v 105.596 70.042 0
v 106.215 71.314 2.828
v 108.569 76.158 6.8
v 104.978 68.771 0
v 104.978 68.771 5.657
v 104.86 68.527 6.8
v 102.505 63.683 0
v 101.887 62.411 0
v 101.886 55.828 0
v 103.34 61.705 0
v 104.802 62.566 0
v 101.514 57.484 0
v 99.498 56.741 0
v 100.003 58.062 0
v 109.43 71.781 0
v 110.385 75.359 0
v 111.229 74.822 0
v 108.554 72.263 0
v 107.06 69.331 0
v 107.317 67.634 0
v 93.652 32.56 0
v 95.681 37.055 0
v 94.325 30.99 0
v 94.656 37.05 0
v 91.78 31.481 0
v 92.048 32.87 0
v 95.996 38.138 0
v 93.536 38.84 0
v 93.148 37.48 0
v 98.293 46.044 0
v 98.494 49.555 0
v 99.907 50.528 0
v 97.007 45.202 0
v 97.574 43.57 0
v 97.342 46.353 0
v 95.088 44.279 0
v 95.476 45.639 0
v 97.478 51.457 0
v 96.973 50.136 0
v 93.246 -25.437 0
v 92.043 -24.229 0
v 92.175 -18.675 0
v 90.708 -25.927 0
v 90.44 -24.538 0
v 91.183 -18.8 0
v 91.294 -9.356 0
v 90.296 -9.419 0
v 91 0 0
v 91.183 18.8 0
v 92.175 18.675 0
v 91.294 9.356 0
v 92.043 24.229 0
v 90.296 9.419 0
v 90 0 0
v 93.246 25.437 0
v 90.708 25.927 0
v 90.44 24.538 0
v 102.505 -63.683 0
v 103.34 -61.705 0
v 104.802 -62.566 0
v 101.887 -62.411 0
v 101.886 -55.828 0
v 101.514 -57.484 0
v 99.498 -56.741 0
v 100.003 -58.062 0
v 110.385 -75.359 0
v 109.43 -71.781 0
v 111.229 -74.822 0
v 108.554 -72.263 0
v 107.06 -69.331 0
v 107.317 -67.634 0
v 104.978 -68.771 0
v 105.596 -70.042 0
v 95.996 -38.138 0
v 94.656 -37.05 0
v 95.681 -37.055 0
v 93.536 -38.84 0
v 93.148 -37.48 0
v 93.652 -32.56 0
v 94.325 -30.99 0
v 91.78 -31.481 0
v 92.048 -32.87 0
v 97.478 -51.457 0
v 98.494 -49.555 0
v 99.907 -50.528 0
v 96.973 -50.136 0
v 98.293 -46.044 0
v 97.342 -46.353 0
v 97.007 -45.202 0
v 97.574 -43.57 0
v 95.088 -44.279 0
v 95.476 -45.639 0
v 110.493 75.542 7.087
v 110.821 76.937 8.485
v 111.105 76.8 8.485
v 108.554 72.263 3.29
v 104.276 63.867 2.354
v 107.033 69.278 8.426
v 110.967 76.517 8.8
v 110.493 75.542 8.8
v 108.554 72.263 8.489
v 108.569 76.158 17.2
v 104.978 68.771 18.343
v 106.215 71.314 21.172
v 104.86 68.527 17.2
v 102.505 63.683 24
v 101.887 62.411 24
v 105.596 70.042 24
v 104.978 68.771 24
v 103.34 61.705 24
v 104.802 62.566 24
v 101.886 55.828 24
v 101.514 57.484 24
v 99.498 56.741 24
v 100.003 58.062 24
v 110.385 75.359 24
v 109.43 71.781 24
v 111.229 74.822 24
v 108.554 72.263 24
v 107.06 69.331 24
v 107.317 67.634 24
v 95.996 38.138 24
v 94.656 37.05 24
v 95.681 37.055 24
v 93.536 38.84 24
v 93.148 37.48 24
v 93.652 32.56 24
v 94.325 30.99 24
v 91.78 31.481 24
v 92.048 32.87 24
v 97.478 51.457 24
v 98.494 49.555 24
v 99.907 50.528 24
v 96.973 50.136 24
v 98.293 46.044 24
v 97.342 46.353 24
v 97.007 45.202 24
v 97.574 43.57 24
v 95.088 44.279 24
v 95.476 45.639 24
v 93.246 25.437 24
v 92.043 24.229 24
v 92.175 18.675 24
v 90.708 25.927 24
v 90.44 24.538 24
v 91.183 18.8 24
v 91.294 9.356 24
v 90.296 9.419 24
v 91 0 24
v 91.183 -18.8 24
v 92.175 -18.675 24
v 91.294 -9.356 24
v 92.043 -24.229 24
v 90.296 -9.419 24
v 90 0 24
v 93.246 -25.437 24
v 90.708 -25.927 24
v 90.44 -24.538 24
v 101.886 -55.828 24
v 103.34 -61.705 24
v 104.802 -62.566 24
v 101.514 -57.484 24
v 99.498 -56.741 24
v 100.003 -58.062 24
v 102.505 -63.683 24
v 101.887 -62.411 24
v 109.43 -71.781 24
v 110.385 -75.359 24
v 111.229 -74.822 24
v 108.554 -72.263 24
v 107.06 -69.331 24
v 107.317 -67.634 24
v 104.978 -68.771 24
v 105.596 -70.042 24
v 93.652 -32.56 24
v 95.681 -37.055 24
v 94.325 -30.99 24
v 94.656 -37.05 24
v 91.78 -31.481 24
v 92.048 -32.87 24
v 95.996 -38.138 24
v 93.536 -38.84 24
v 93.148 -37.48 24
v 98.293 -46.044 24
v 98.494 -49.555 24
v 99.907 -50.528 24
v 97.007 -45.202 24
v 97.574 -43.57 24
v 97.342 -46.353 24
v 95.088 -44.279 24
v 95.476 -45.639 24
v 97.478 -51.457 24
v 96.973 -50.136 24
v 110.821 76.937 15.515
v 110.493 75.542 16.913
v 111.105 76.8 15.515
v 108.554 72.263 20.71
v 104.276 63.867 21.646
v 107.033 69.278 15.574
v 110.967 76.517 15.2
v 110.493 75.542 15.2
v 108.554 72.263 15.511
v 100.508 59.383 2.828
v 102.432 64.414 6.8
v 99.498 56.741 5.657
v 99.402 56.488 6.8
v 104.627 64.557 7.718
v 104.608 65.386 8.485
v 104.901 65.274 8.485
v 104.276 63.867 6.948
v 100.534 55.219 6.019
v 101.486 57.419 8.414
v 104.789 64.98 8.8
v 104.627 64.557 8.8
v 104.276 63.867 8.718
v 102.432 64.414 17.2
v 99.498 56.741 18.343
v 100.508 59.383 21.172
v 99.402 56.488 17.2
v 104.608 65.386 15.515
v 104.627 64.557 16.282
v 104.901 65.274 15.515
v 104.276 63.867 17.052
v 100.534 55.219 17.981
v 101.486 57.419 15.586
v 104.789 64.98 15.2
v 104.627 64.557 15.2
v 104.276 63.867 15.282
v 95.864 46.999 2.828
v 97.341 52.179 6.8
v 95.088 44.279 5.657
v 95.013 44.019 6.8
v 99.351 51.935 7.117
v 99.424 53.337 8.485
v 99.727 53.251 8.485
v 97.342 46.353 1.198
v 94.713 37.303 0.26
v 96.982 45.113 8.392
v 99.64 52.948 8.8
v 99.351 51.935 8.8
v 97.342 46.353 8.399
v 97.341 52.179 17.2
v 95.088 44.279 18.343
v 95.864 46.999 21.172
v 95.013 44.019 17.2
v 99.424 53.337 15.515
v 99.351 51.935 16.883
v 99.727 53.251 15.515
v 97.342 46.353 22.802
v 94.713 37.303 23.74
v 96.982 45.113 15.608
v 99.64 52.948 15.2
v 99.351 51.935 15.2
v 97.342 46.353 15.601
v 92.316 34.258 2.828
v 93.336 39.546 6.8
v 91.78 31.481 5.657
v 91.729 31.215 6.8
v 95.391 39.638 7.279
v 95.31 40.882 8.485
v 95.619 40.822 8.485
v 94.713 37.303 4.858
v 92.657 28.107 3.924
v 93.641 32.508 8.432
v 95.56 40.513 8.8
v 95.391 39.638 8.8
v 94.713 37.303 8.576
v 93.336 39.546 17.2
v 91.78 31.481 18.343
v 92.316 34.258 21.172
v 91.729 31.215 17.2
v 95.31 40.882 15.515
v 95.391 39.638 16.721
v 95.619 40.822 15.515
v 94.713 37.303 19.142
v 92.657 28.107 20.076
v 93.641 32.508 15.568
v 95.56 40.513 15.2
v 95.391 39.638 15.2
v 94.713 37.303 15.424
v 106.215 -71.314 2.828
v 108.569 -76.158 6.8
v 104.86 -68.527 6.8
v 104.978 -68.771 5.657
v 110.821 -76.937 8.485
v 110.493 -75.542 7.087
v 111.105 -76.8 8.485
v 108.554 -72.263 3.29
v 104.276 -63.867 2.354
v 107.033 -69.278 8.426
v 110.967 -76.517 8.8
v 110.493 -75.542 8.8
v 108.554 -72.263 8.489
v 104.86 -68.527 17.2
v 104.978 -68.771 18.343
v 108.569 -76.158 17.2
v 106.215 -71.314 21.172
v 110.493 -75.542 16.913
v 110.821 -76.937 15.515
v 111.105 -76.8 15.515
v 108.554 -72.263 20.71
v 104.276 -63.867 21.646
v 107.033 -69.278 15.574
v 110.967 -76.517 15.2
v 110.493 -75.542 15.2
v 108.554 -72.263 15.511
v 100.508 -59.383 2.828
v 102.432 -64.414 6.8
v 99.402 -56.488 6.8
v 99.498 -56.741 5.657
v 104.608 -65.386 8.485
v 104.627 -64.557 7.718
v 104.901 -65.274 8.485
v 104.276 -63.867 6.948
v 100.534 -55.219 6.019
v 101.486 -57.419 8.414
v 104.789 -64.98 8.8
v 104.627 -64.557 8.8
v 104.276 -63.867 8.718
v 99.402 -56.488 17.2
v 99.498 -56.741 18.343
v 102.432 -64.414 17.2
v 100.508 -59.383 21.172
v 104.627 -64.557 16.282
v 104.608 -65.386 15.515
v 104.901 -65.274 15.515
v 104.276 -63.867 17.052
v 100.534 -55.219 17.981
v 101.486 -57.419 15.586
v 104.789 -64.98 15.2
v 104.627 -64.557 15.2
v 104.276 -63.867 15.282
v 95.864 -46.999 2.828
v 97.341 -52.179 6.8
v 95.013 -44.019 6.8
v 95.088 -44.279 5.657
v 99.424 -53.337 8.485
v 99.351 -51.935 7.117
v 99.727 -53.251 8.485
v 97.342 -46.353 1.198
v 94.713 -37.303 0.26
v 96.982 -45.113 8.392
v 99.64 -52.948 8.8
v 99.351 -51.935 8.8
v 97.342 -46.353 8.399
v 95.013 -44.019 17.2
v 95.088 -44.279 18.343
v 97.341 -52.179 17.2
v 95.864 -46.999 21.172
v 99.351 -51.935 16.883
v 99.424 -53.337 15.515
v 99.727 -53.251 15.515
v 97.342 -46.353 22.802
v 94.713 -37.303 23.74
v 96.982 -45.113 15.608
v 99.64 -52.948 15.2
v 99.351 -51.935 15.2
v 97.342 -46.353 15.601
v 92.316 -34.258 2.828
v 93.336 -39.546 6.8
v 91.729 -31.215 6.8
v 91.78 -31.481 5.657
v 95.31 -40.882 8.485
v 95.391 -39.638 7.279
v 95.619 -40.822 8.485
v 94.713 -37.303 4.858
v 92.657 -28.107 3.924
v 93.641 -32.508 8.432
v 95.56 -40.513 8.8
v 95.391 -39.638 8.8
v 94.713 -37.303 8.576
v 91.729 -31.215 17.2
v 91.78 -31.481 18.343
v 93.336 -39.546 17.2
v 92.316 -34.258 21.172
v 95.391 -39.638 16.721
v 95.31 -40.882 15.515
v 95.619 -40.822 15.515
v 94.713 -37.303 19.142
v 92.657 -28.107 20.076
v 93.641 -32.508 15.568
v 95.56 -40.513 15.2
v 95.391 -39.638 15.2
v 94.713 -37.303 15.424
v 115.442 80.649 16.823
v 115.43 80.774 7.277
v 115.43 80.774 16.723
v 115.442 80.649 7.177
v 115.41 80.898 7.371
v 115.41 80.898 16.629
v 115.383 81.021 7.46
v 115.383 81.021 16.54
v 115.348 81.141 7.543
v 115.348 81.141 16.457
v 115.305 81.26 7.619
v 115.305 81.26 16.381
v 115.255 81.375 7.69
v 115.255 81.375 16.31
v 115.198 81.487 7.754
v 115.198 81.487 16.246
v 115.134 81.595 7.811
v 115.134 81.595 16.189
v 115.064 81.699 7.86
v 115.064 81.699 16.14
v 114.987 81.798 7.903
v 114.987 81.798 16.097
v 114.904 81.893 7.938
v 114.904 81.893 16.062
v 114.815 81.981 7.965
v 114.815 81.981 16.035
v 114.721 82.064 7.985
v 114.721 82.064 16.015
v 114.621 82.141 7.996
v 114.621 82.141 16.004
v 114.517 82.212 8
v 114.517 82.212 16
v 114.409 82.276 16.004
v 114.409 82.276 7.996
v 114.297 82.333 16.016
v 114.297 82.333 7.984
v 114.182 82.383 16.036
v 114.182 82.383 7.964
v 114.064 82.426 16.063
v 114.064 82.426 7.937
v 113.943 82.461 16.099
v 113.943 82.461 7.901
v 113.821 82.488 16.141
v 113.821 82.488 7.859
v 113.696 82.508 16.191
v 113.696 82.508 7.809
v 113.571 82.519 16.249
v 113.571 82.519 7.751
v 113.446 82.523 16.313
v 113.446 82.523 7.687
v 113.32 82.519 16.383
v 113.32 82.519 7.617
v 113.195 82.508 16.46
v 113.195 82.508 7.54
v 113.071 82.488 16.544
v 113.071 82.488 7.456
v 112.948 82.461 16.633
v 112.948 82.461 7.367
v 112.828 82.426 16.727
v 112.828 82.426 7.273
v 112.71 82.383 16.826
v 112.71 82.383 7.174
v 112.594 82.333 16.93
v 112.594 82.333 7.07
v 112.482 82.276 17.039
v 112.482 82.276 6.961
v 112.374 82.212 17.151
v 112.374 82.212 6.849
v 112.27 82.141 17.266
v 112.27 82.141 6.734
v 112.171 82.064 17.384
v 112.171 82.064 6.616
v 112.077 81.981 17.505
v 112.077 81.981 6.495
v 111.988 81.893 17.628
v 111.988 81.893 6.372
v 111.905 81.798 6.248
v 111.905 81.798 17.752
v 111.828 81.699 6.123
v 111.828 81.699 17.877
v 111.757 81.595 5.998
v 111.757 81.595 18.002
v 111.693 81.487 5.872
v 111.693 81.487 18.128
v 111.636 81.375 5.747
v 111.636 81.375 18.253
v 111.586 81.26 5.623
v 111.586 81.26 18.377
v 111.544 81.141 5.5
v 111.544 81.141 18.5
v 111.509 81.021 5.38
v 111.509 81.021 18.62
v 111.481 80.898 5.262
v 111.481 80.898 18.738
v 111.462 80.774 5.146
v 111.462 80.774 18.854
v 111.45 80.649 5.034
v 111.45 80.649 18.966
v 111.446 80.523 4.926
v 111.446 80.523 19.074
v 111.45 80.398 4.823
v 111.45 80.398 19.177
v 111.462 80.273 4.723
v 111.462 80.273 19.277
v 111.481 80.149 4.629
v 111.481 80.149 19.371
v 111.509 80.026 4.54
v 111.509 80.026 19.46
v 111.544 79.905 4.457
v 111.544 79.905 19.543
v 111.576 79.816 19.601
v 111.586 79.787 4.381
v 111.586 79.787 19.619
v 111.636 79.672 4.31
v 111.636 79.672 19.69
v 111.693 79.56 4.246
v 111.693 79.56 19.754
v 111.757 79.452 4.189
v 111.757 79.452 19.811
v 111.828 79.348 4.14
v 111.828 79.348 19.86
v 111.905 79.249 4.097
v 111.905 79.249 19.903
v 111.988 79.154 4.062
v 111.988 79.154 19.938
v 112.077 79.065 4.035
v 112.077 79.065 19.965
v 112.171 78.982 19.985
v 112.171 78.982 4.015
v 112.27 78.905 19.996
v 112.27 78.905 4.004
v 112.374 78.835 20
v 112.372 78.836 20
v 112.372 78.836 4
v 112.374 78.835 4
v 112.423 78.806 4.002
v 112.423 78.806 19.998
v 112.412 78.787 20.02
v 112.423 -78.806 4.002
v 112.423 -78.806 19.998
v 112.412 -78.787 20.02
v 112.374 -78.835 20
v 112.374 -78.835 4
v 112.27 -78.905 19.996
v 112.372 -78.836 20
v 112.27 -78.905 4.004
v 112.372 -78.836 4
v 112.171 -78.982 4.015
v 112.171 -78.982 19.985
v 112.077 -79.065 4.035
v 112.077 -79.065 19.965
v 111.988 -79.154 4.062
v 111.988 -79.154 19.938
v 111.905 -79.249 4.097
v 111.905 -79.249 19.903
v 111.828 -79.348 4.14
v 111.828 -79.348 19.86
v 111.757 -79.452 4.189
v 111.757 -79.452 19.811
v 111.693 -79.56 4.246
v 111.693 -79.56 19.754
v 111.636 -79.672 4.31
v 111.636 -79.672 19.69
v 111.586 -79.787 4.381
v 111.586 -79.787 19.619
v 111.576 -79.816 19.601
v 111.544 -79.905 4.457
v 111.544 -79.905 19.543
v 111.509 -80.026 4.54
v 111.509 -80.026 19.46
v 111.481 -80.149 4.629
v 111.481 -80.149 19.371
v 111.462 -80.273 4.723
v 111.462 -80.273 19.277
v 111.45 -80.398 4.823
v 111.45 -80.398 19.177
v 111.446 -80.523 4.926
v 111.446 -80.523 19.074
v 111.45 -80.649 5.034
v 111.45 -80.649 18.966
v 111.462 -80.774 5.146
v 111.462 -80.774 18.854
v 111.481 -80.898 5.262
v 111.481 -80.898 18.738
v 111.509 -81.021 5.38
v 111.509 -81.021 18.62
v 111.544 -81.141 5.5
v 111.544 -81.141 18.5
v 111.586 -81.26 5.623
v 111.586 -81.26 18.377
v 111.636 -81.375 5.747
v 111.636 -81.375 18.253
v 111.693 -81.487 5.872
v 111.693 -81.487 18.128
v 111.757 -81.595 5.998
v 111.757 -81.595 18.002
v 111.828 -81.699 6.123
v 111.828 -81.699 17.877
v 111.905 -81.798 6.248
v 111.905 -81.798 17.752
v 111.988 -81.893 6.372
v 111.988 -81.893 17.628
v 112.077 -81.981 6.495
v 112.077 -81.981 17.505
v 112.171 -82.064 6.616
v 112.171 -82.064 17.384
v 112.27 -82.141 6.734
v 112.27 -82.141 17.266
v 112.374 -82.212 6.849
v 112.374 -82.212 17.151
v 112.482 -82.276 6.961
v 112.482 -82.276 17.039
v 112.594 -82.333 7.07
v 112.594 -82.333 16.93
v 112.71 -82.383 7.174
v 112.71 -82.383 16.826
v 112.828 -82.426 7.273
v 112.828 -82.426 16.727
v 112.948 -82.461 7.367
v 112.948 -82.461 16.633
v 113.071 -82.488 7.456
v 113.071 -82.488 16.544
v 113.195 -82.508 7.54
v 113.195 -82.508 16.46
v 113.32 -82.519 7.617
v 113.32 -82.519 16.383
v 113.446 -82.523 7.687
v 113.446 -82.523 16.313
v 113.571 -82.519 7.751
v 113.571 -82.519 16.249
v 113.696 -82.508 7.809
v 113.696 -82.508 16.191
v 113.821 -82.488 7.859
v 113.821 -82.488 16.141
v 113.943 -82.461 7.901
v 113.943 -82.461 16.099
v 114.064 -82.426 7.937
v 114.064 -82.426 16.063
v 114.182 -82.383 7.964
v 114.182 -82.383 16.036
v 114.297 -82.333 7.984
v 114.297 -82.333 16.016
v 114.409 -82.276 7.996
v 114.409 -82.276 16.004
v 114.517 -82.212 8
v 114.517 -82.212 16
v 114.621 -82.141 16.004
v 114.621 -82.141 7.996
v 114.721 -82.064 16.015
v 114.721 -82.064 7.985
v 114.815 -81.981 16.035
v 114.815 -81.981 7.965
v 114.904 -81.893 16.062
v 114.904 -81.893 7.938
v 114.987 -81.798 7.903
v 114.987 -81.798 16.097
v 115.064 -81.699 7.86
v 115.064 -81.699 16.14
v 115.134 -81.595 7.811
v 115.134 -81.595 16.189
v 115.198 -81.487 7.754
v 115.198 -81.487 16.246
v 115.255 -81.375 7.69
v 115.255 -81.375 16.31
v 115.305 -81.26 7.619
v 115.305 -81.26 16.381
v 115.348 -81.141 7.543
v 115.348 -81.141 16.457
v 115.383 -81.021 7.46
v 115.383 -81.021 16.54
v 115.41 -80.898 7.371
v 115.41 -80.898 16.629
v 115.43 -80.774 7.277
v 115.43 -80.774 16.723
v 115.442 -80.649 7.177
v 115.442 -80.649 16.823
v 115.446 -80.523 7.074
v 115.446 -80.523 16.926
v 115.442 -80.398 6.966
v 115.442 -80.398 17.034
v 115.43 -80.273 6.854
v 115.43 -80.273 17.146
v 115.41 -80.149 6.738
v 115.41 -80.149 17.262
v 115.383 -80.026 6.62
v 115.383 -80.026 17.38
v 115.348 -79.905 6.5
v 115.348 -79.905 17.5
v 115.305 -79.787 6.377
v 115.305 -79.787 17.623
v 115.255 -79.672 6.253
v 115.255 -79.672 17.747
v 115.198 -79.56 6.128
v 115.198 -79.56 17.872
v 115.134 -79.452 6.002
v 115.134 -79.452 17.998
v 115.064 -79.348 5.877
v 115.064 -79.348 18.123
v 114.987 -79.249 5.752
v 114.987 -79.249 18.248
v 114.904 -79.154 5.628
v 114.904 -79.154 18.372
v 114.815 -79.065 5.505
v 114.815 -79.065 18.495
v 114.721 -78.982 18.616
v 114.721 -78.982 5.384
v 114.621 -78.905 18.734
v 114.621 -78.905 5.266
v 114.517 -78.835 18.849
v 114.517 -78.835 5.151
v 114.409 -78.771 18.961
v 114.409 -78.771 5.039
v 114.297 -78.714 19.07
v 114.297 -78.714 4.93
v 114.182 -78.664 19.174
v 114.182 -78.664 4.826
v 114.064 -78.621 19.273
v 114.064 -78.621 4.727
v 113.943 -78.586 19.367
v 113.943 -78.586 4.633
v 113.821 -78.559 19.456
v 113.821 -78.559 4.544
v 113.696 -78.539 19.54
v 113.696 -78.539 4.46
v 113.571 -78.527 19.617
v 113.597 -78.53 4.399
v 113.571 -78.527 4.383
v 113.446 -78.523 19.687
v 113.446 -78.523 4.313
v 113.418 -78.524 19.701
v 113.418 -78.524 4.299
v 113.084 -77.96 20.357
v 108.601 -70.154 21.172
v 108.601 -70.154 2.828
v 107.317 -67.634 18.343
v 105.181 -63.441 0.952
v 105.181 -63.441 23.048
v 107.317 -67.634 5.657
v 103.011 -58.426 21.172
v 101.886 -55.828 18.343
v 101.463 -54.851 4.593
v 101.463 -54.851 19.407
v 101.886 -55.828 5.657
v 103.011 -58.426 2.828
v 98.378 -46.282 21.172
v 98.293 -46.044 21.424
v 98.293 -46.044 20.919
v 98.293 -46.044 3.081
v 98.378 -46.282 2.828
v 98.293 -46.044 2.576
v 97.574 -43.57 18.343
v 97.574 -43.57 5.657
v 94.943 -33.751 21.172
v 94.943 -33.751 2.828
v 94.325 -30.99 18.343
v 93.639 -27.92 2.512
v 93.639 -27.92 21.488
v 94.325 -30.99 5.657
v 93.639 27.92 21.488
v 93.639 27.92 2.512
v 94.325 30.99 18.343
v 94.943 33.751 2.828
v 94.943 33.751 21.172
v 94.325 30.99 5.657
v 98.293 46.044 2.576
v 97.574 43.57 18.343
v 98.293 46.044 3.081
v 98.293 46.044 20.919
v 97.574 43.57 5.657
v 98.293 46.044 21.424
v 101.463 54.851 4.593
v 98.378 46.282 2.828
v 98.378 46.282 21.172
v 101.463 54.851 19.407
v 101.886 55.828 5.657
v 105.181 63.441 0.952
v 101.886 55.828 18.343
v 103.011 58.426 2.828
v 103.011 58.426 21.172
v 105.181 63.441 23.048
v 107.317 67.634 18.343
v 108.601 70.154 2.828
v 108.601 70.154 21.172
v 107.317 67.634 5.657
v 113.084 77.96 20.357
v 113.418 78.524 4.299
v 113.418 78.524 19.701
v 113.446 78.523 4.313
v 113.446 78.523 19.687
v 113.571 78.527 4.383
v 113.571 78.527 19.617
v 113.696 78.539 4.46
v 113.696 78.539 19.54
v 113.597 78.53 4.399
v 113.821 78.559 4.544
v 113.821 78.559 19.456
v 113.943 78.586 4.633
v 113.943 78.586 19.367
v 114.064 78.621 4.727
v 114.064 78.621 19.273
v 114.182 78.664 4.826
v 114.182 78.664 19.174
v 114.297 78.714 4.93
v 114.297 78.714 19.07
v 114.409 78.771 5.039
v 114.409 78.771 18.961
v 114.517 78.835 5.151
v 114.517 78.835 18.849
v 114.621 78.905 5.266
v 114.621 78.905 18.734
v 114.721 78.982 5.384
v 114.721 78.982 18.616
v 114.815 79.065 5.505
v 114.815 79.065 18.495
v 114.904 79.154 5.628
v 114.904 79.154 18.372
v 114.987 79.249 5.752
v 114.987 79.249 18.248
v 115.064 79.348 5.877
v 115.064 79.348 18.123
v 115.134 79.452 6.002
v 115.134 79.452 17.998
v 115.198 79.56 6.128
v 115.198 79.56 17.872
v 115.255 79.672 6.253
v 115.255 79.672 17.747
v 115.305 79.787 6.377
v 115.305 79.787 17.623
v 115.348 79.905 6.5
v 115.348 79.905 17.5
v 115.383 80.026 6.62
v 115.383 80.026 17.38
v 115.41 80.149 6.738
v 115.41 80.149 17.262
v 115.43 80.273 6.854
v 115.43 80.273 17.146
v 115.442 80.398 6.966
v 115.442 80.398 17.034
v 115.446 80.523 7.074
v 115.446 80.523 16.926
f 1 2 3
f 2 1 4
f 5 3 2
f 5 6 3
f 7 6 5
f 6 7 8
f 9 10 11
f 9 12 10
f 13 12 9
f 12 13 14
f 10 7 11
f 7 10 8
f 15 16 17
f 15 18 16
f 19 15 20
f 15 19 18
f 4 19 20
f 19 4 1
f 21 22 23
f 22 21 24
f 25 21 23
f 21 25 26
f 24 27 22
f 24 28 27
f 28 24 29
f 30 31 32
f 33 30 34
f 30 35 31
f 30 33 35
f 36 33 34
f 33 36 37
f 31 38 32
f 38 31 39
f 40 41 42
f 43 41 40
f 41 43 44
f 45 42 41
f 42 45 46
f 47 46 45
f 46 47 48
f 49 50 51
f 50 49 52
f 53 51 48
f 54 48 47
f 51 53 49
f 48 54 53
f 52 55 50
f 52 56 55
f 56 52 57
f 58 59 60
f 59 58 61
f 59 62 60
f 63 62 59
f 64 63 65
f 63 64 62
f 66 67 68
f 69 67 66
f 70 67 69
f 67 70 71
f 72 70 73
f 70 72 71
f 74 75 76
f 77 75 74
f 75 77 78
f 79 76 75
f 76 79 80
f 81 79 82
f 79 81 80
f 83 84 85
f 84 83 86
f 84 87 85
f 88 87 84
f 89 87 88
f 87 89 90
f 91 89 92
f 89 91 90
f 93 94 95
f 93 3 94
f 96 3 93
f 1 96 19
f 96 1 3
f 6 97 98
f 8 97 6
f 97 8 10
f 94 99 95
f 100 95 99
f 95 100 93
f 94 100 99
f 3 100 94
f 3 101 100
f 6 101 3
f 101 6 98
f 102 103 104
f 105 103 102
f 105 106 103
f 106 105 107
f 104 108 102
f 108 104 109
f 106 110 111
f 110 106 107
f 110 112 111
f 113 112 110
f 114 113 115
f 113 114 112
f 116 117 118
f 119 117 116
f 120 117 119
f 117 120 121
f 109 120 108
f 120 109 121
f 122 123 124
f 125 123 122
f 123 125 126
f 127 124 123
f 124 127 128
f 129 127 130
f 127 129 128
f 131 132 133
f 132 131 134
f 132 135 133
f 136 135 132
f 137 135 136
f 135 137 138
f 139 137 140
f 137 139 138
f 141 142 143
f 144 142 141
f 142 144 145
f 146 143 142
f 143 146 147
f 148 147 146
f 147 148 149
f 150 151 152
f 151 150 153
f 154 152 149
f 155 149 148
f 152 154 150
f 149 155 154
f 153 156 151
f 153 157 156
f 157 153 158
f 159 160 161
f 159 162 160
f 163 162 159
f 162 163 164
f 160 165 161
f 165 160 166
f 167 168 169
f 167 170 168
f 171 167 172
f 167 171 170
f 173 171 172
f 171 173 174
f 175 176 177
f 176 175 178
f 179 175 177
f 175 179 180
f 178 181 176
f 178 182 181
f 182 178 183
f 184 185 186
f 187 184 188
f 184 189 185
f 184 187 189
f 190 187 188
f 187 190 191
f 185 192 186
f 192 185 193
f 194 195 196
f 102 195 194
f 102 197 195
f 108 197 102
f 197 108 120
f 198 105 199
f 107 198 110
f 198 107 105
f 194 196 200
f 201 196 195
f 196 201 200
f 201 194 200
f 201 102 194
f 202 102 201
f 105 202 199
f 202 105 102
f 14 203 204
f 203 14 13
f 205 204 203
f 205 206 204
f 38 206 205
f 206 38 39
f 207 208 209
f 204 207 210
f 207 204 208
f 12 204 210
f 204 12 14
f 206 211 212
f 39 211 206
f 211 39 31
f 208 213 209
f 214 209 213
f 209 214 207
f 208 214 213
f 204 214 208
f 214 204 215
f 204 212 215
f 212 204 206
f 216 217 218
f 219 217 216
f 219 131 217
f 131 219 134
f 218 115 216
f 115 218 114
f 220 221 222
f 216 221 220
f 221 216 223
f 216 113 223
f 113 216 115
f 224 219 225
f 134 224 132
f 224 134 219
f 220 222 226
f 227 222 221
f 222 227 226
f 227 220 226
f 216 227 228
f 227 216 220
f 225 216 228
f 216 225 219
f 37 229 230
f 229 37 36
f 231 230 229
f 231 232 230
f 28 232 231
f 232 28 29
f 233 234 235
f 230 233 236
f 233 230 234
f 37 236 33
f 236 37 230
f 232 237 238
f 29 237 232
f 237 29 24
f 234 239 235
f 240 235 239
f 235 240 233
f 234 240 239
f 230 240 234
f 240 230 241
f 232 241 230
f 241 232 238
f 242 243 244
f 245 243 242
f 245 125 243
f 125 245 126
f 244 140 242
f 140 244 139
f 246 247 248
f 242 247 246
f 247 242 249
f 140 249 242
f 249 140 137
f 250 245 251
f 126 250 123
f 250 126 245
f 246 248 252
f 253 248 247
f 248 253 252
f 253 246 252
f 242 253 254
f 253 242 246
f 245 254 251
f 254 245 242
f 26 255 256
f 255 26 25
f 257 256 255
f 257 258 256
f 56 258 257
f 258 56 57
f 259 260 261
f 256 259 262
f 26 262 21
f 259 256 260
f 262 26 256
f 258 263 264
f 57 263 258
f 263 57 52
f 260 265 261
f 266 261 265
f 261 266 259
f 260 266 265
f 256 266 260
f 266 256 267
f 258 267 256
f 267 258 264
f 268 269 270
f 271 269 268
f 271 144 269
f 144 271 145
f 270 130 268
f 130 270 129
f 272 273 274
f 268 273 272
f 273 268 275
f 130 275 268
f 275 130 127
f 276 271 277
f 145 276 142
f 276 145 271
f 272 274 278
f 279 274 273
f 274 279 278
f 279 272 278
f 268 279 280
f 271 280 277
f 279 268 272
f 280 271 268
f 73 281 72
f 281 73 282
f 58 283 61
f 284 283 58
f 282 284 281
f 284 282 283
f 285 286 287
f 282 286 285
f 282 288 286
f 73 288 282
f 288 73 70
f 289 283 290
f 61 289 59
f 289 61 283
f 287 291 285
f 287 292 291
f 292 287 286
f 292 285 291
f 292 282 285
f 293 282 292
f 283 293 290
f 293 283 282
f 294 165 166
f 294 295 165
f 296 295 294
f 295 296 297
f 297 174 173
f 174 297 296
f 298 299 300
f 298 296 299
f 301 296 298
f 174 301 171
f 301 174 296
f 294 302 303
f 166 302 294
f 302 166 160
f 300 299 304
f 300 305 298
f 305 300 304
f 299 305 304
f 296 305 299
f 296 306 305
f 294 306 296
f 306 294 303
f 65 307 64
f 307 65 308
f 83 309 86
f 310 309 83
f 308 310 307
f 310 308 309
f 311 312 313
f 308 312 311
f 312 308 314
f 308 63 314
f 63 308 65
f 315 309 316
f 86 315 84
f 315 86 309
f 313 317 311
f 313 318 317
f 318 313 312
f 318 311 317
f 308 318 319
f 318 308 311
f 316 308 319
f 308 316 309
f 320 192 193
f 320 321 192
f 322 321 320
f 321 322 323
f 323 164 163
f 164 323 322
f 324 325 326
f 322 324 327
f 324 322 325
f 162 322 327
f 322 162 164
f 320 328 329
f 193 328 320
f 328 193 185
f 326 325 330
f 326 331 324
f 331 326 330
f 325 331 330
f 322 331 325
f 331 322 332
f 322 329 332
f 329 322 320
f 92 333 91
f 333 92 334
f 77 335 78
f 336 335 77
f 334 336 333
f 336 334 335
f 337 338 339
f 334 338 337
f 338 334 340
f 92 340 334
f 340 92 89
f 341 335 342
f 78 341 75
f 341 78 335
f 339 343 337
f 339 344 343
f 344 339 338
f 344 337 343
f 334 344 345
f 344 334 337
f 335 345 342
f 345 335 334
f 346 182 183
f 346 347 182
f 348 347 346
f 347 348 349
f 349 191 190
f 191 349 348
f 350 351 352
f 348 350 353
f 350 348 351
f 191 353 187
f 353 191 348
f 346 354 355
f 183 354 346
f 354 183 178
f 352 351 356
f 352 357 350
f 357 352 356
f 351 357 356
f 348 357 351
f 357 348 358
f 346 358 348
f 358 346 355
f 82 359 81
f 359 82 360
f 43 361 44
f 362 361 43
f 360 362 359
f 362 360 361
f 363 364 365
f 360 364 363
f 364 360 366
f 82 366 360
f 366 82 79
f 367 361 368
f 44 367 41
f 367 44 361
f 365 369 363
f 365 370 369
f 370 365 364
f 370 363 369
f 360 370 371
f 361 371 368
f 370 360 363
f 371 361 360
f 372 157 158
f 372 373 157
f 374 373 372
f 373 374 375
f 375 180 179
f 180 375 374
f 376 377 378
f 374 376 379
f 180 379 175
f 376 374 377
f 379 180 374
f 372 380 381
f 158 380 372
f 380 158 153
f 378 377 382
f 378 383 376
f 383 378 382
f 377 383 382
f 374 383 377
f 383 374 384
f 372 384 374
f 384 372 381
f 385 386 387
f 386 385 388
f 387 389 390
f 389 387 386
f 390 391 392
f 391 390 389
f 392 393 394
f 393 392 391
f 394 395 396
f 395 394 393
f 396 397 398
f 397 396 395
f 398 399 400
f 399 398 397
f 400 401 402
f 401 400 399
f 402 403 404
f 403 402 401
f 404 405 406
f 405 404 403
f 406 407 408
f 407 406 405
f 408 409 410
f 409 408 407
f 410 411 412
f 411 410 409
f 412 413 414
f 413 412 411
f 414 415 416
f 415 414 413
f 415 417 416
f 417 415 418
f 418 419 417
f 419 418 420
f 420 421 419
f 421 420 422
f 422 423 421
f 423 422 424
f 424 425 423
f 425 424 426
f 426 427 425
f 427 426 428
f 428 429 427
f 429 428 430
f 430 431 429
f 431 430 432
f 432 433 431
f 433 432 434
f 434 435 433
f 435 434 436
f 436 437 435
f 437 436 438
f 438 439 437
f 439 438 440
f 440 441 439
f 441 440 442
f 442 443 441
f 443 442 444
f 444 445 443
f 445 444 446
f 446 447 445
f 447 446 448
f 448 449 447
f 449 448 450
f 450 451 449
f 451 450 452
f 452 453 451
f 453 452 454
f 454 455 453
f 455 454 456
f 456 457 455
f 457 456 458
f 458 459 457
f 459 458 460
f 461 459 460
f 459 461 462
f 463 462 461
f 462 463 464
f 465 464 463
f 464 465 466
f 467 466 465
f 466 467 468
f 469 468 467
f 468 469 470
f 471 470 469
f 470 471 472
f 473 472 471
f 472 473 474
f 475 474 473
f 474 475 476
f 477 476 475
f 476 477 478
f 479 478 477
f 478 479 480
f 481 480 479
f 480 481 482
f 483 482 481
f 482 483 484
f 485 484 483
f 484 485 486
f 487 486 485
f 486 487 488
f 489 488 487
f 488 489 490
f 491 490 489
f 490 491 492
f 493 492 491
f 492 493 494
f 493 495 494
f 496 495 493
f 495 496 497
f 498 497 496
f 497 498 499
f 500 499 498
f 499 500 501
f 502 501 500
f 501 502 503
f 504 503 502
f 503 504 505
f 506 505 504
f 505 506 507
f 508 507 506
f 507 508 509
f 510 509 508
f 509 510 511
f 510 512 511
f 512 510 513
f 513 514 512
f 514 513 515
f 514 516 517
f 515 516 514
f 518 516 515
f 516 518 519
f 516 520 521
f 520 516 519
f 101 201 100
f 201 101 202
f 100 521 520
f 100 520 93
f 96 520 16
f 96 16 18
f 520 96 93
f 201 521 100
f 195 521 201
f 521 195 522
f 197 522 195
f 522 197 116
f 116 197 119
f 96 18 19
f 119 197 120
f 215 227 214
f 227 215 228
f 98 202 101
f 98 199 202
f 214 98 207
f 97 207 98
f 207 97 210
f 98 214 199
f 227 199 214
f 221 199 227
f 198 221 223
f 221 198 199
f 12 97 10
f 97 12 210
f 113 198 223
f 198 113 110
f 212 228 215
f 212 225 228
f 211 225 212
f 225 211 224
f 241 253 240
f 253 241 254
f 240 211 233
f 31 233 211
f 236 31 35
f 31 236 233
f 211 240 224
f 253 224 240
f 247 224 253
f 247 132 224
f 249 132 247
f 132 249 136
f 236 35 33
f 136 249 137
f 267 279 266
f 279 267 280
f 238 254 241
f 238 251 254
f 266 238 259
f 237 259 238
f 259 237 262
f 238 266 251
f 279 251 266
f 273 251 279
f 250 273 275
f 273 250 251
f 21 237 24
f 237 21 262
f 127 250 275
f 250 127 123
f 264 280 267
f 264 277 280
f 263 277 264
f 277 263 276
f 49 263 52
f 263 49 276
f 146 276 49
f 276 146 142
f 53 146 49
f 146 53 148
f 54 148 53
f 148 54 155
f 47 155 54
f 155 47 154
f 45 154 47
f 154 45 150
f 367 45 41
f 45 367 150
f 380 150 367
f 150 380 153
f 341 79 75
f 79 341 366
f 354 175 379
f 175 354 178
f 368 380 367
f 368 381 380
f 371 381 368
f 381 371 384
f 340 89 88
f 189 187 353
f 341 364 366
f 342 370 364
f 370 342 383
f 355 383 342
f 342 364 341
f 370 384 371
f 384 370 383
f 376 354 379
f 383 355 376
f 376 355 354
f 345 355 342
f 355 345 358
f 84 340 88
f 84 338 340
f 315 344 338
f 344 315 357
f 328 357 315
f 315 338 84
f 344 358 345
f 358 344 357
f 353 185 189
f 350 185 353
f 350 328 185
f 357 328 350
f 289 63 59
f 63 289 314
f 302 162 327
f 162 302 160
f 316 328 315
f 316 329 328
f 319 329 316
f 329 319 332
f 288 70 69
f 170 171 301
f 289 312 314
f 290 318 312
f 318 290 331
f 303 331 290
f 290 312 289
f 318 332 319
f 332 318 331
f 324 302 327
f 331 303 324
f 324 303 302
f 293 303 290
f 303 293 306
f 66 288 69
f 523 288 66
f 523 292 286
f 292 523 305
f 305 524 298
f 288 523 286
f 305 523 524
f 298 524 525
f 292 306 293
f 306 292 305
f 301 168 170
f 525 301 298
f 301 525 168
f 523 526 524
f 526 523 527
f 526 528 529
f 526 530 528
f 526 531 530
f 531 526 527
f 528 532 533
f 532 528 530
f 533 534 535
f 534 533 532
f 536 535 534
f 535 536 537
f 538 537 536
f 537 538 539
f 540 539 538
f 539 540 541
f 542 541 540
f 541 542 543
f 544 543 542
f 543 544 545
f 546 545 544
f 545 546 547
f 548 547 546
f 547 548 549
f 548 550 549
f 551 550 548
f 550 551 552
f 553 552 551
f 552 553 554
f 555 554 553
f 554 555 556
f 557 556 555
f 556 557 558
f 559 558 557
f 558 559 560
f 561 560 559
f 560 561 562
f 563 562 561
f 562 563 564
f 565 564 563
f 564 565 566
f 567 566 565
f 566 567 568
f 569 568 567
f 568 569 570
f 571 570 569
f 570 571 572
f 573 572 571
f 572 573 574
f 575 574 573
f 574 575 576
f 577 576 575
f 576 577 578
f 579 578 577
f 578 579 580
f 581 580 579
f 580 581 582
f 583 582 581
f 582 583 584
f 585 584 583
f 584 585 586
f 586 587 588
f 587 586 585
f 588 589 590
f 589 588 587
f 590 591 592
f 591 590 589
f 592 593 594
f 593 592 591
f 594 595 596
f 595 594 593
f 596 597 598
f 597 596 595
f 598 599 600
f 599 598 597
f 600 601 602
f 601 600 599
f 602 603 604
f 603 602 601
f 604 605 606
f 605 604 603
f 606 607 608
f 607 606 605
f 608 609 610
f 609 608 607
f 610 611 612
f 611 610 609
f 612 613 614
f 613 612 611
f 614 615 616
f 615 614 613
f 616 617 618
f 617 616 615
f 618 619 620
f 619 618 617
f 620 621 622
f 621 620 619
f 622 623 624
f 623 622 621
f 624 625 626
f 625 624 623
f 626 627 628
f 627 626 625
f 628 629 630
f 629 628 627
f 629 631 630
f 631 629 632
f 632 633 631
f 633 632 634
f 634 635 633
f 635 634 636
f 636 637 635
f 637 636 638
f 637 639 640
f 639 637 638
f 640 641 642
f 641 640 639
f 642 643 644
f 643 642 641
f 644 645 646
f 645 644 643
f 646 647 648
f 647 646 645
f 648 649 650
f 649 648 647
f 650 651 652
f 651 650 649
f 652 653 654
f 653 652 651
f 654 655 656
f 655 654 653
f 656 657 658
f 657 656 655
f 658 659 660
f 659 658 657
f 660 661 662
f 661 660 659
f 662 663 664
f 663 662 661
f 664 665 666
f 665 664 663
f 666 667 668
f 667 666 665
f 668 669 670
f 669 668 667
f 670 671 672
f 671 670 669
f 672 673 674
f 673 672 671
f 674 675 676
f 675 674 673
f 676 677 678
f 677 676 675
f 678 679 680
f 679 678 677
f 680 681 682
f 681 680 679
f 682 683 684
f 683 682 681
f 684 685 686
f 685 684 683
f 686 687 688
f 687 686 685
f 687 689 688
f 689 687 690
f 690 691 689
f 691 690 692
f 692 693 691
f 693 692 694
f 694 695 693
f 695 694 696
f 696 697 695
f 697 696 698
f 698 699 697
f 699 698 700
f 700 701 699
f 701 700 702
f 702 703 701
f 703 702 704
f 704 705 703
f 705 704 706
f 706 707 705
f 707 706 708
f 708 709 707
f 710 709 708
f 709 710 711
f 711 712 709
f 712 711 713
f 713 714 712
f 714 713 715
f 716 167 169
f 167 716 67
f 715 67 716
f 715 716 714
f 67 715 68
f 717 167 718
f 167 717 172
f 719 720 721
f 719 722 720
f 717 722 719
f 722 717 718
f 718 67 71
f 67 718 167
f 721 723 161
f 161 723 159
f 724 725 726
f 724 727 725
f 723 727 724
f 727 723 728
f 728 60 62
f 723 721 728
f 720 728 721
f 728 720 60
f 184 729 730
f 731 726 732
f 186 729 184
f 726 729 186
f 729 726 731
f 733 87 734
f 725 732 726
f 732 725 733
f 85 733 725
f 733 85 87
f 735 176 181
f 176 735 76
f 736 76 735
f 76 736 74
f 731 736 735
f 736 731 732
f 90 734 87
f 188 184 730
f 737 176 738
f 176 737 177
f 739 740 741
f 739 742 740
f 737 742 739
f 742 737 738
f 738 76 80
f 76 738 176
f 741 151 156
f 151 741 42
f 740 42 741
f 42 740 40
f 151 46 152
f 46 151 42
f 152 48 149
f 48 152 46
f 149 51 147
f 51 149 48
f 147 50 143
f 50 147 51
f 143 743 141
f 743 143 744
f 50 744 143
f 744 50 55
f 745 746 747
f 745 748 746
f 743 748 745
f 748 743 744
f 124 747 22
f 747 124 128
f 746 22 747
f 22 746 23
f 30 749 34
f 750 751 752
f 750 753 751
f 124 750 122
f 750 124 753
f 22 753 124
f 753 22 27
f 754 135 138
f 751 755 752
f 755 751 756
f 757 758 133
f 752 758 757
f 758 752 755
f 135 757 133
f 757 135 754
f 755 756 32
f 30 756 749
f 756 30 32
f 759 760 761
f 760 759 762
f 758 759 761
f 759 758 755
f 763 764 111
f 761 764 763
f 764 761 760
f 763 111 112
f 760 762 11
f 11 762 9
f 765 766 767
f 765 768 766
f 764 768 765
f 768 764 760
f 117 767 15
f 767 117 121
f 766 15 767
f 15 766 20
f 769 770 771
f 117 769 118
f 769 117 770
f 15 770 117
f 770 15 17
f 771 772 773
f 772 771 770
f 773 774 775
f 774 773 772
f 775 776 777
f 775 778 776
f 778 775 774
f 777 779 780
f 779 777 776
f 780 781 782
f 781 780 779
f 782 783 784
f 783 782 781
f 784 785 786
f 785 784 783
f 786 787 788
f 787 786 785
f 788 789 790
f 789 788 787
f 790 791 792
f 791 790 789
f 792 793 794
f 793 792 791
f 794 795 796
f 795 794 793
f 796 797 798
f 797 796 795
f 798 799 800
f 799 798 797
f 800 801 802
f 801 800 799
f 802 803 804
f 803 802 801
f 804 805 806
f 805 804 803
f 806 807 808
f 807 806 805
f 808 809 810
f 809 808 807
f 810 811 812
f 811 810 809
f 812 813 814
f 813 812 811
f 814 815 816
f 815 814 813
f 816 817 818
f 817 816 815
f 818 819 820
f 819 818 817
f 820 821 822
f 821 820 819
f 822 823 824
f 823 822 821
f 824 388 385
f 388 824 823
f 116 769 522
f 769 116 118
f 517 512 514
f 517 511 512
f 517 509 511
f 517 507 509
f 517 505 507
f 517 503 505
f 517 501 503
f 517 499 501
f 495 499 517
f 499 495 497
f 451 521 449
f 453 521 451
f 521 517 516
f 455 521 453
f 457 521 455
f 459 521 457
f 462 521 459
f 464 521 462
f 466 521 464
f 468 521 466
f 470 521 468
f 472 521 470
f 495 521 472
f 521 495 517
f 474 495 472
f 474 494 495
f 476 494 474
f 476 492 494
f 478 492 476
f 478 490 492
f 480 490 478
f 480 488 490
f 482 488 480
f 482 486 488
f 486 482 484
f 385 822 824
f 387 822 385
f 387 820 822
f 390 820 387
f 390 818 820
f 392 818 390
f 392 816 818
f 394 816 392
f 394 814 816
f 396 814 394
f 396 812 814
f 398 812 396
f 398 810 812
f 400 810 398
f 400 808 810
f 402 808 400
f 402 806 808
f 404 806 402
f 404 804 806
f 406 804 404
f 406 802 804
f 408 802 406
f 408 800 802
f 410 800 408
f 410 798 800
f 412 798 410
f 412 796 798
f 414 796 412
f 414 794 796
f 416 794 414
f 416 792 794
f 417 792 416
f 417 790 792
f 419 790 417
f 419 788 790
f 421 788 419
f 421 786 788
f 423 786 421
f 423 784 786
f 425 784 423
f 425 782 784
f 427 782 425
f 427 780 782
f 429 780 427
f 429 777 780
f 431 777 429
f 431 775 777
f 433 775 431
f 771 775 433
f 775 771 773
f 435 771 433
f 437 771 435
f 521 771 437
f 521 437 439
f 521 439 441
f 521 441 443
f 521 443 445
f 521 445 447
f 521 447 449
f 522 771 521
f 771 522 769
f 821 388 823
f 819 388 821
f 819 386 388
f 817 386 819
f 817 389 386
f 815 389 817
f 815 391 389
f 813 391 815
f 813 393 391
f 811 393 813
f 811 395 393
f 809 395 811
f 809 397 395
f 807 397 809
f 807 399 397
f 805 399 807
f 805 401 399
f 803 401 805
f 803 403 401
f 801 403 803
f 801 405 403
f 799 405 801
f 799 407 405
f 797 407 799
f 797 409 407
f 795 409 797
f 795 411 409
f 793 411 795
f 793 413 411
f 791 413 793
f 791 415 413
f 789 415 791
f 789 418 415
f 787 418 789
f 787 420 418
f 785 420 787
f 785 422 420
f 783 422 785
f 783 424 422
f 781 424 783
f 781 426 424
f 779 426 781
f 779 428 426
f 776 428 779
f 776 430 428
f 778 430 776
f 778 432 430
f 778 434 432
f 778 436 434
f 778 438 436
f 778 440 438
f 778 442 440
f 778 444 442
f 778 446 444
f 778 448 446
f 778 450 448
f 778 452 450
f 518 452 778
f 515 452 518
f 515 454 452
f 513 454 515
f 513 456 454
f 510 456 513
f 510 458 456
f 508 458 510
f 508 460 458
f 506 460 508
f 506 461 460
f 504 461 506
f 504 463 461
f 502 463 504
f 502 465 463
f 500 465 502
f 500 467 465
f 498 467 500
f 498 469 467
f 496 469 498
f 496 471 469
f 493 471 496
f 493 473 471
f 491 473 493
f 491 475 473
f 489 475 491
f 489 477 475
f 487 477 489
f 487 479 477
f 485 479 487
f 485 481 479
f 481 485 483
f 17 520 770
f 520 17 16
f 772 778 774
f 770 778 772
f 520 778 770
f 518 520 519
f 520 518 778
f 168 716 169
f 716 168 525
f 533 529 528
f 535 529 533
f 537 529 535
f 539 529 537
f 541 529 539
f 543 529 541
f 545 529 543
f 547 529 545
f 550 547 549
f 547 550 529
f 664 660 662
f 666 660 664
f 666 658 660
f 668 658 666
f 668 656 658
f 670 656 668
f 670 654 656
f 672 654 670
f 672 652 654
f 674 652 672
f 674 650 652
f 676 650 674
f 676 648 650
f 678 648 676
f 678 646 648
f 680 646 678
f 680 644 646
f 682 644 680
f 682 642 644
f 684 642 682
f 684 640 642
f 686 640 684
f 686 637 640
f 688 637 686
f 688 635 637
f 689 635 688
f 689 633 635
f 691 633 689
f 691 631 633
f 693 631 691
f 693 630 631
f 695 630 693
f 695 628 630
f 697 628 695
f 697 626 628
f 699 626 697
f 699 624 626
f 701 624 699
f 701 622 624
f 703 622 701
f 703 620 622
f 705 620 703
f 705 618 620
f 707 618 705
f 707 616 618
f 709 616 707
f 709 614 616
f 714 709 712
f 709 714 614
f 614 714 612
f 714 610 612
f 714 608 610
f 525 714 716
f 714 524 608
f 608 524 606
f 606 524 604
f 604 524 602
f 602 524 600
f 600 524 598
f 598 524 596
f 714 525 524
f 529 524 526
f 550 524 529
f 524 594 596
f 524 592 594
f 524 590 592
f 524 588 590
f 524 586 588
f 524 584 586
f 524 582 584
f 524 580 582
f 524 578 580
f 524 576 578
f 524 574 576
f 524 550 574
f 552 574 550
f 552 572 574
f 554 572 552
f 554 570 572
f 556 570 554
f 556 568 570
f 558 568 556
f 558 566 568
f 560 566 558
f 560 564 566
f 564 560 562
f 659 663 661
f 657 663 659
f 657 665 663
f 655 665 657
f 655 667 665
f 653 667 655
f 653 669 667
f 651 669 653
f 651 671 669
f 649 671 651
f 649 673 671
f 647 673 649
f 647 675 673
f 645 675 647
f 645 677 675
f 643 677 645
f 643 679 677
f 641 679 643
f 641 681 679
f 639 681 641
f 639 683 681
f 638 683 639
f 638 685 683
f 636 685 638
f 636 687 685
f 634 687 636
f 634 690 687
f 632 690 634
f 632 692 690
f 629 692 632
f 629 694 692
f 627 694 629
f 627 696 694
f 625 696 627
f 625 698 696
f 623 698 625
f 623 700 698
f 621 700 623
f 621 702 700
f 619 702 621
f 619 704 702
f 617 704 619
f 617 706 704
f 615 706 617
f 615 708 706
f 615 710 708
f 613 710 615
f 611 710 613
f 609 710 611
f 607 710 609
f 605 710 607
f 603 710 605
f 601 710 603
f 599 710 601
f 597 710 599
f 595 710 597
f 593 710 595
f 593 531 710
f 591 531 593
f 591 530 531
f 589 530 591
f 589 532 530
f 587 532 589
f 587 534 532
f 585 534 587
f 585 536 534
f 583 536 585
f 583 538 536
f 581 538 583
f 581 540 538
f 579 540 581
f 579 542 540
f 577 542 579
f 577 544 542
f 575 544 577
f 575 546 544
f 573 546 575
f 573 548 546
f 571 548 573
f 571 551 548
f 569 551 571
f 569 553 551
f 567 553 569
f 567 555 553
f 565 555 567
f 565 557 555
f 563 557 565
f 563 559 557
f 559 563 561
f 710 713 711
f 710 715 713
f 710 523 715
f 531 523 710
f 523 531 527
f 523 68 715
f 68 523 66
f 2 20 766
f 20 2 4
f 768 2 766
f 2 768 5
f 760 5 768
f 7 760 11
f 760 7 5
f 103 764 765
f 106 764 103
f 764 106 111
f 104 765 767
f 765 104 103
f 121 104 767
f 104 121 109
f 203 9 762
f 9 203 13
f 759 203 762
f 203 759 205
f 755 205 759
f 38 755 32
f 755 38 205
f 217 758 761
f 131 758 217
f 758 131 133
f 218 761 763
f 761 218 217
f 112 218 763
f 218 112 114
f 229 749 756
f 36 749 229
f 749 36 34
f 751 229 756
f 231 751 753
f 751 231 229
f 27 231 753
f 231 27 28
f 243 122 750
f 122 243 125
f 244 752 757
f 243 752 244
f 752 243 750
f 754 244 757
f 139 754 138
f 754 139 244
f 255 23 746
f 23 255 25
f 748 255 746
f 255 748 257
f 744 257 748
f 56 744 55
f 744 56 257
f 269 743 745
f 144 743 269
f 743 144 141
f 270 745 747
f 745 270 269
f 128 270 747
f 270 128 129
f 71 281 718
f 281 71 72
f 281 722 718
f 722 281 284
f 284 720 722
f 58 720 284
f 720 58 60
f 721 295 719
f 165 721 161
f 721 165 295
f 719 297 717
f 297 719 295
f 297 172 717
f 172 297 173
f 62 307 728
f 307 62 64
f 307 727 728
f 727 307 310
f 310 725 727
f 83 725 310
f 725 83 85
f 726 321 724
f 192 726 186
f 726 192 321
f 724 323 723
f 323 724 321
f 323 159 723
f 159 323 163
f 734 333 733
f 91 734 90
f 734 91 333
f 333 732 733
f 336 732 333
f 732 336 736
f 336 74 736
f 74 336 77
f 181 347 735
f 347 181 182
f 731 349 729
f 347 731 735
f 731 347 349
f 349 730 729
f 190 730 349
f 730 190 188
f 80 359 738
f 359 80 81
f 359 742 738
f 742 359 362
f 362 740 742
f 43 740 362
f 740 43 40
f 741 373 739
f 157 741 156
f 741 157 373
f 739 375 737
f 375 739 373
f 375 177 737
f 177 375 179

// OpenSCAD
$fn=100;

arch_distance = 170; //width of the mask buckle
radius_of_arch = 150;
band_thickness=1.0;
buckle_height= 24.0;
end_knub_size=2;
hook_width = 4; //2
hook_depth = 2;
hook_count = 4;
hook_height = buckle_height/3; // /4

bed_size=[250,200];

number_to_print=1; //42 max


for(num=[1:number_to_print]){
  translate([radius_of_arch+bed_size[0]/2-30,0]){
    rotate(90){
      translate([0,(band_thickness+hook_depth+2)*num]){
        stacked_headbands(arch_distance,
                        radius_of_arch,
                        band_thickness,
                        buckle_height,
                        end_knub_size,
                        hook_width,
                        hook_depth,
                        hook_count,
                        hook_height);
      }
    }
  }
  
  color("#000000"){
    square(bed_size, center=true);
  }
}

module stacked_headbands(arch_distance,
                  radius_of_arch,
                  band_thickness,
                  buckle_height,
                  end_knub_size,
                  hook_width,
                  hook_depth,
                  hook_count,
                  hook_height){
            
  angle = 360*(arch_distance/(2*PI*radius_of_arch));
                    

  difference(){
    union(){
      linear_extrude(buckle_height){   
        union(){    
          difference(){
            union(){
              circle(radius_of_arch);
            }
           
            circle(radius_of_arch-band_thickness);
            rotate(90+angle/2){
              square(arch_distance);
            }
            
            rotate(-angle/2){
              square(arch_distance);
            }
            
            translate([0,-arch_distance]){
              square(2*arch_distance,center=true);
            }  
          }
          //Create knubs on end
          mirror_copy(){
            translate(
                 X_Y_from_radius_angle(
                     radius_of_arch, 
                     (90-angle/2))){
              circle(end_knub_size);
            }
          }
        }
      }
      
      //Create the knubs
      mirror_copy(){
        for(x=[1:hook_count]){
          rotate(-angle/2.1 + x*5){
            translate([0,
               radius_of_arch-band_thickness/2]){
              create_extension(buckle_height, 
                  hook_width, hook_depth, 
                  hook_height);  
            }
          }
        }
      }
    }
    //end angle difference
    mirror_copy(){
      rotate(-angle/2){
        translate([0,radius_of_arch]){
          end_angle(buckle_height);
        }
      }
    } 
    
    //Create the knubs negative part
    mirror_copy(){
      for(x=[1:hook_count]){
        rotate(-angle/2.1 + x*5){
          translate([0,
             radius_of_arch-band_thickness/2-1,
             ]){
               create_extension_removal(
                   buckle_height, 
                   hook_width, hook_depth,
                   hook_height);  
          }
        }
      }
    } 
  }
  
  /* For testing purposes...
  translate([0,250]){
    difference(){
    create_extension(buckle_height, 
                  hook_width, hook_depth,
                  hook_height);
    
    translate([0,-1]){
      color("#FF0000"){
        create_extension_removal(
                     buckle_height, 
                     hook_width, hook_depth,
                     hook_height);  
      }
    }
    }
  } 
 */ 
}

//Calculate [X,Y] given radius and angle
function X_Y_from_radius_angle(radius, angle) =
   [radius*cos(angle),radius*sin(angle)];


module end_angle(buckle_height){
  left_adjust = -buckle_height/4;

  translate([0,buckle_height/2]){
    rotate([90,0,0]){
      linear_extrude(buckle_height){
        translate([left_adjust,0]){  
          polygon([
                  [0,0],
                  [buckle_height/3, 
                     buckle_height/3],
                  [buckle_height/3, 
                     2*buckle_height/3],  
                  [0,buckle_height],
                  [buckle_height/2,buckle_height],
                  [buckle_height/2, 0],
                  ]);
        }
      }  
    }
  }
}

module hook(size_factor,hook_width,
            hook_depth,hook_height,hook_height){
  left_adjust=(size_factor*hook_width/sin(45))/2;


  translate([0,hook_depth]){
    rotate([90,0,0]){
      linear_extrude(hook_depth){
        translate([-left_adjust,0,0]){
          polygon([
            [0,0], 
            [size_factor*size_factor*hook_height*sin(45),
             size_factor*size_factor*hook_height*sin(45)],
            [size_factor*size_factor*hook_height*sin(45) 
             + size_factor*hook_width*sin(45),   
               size_factor*size_factor*hook_height*sin(45)
             - size_factor*hook_width*sin(45)],
            [size_factor*hook_width/cos(45), 0],
           ]);  
        } 
      }
    } 
  }
}

module create_extension(buckle_height, hook_width, hook_depth,hook_height){
  
  size_factor=1.5;
  mirror_copy_headband(){
    difference(){
      color("#00FF00"){
      hook(size_factor,
           hook_width,
           hook_depth,
           hook_height);
      }
      translate([-size_factor*hook_width,
                  1.1*hook_height]){
        rotate([45,0,0]){
          color("#123456", 0.5){
          cube(buckle_height,buckle_height);
          }
        }
      }
    }
  }
}

module create_extension_removal(buckle_height, hook_width, hook_depth,hook_height){
  
  mirror_copy_headband(){
    hook(1.0,hook_width,6*hook_depth,hook_height);
  }
}

//See https://en.wikibooks.org/wiki/OpenSCAD_User_Manual/Tips_and_Tricks#Create_a_mirrored_object_while_retaining_the_original
module mirror_copy(v = [1, 0, 0]) {
    children();
    mirror(v) children();
}

module mirror_copy_headband(v = [0, 0, 1]) {
    children();
    translate([0,0,buckle_height]){
      mirror(v) children();
    }
}
